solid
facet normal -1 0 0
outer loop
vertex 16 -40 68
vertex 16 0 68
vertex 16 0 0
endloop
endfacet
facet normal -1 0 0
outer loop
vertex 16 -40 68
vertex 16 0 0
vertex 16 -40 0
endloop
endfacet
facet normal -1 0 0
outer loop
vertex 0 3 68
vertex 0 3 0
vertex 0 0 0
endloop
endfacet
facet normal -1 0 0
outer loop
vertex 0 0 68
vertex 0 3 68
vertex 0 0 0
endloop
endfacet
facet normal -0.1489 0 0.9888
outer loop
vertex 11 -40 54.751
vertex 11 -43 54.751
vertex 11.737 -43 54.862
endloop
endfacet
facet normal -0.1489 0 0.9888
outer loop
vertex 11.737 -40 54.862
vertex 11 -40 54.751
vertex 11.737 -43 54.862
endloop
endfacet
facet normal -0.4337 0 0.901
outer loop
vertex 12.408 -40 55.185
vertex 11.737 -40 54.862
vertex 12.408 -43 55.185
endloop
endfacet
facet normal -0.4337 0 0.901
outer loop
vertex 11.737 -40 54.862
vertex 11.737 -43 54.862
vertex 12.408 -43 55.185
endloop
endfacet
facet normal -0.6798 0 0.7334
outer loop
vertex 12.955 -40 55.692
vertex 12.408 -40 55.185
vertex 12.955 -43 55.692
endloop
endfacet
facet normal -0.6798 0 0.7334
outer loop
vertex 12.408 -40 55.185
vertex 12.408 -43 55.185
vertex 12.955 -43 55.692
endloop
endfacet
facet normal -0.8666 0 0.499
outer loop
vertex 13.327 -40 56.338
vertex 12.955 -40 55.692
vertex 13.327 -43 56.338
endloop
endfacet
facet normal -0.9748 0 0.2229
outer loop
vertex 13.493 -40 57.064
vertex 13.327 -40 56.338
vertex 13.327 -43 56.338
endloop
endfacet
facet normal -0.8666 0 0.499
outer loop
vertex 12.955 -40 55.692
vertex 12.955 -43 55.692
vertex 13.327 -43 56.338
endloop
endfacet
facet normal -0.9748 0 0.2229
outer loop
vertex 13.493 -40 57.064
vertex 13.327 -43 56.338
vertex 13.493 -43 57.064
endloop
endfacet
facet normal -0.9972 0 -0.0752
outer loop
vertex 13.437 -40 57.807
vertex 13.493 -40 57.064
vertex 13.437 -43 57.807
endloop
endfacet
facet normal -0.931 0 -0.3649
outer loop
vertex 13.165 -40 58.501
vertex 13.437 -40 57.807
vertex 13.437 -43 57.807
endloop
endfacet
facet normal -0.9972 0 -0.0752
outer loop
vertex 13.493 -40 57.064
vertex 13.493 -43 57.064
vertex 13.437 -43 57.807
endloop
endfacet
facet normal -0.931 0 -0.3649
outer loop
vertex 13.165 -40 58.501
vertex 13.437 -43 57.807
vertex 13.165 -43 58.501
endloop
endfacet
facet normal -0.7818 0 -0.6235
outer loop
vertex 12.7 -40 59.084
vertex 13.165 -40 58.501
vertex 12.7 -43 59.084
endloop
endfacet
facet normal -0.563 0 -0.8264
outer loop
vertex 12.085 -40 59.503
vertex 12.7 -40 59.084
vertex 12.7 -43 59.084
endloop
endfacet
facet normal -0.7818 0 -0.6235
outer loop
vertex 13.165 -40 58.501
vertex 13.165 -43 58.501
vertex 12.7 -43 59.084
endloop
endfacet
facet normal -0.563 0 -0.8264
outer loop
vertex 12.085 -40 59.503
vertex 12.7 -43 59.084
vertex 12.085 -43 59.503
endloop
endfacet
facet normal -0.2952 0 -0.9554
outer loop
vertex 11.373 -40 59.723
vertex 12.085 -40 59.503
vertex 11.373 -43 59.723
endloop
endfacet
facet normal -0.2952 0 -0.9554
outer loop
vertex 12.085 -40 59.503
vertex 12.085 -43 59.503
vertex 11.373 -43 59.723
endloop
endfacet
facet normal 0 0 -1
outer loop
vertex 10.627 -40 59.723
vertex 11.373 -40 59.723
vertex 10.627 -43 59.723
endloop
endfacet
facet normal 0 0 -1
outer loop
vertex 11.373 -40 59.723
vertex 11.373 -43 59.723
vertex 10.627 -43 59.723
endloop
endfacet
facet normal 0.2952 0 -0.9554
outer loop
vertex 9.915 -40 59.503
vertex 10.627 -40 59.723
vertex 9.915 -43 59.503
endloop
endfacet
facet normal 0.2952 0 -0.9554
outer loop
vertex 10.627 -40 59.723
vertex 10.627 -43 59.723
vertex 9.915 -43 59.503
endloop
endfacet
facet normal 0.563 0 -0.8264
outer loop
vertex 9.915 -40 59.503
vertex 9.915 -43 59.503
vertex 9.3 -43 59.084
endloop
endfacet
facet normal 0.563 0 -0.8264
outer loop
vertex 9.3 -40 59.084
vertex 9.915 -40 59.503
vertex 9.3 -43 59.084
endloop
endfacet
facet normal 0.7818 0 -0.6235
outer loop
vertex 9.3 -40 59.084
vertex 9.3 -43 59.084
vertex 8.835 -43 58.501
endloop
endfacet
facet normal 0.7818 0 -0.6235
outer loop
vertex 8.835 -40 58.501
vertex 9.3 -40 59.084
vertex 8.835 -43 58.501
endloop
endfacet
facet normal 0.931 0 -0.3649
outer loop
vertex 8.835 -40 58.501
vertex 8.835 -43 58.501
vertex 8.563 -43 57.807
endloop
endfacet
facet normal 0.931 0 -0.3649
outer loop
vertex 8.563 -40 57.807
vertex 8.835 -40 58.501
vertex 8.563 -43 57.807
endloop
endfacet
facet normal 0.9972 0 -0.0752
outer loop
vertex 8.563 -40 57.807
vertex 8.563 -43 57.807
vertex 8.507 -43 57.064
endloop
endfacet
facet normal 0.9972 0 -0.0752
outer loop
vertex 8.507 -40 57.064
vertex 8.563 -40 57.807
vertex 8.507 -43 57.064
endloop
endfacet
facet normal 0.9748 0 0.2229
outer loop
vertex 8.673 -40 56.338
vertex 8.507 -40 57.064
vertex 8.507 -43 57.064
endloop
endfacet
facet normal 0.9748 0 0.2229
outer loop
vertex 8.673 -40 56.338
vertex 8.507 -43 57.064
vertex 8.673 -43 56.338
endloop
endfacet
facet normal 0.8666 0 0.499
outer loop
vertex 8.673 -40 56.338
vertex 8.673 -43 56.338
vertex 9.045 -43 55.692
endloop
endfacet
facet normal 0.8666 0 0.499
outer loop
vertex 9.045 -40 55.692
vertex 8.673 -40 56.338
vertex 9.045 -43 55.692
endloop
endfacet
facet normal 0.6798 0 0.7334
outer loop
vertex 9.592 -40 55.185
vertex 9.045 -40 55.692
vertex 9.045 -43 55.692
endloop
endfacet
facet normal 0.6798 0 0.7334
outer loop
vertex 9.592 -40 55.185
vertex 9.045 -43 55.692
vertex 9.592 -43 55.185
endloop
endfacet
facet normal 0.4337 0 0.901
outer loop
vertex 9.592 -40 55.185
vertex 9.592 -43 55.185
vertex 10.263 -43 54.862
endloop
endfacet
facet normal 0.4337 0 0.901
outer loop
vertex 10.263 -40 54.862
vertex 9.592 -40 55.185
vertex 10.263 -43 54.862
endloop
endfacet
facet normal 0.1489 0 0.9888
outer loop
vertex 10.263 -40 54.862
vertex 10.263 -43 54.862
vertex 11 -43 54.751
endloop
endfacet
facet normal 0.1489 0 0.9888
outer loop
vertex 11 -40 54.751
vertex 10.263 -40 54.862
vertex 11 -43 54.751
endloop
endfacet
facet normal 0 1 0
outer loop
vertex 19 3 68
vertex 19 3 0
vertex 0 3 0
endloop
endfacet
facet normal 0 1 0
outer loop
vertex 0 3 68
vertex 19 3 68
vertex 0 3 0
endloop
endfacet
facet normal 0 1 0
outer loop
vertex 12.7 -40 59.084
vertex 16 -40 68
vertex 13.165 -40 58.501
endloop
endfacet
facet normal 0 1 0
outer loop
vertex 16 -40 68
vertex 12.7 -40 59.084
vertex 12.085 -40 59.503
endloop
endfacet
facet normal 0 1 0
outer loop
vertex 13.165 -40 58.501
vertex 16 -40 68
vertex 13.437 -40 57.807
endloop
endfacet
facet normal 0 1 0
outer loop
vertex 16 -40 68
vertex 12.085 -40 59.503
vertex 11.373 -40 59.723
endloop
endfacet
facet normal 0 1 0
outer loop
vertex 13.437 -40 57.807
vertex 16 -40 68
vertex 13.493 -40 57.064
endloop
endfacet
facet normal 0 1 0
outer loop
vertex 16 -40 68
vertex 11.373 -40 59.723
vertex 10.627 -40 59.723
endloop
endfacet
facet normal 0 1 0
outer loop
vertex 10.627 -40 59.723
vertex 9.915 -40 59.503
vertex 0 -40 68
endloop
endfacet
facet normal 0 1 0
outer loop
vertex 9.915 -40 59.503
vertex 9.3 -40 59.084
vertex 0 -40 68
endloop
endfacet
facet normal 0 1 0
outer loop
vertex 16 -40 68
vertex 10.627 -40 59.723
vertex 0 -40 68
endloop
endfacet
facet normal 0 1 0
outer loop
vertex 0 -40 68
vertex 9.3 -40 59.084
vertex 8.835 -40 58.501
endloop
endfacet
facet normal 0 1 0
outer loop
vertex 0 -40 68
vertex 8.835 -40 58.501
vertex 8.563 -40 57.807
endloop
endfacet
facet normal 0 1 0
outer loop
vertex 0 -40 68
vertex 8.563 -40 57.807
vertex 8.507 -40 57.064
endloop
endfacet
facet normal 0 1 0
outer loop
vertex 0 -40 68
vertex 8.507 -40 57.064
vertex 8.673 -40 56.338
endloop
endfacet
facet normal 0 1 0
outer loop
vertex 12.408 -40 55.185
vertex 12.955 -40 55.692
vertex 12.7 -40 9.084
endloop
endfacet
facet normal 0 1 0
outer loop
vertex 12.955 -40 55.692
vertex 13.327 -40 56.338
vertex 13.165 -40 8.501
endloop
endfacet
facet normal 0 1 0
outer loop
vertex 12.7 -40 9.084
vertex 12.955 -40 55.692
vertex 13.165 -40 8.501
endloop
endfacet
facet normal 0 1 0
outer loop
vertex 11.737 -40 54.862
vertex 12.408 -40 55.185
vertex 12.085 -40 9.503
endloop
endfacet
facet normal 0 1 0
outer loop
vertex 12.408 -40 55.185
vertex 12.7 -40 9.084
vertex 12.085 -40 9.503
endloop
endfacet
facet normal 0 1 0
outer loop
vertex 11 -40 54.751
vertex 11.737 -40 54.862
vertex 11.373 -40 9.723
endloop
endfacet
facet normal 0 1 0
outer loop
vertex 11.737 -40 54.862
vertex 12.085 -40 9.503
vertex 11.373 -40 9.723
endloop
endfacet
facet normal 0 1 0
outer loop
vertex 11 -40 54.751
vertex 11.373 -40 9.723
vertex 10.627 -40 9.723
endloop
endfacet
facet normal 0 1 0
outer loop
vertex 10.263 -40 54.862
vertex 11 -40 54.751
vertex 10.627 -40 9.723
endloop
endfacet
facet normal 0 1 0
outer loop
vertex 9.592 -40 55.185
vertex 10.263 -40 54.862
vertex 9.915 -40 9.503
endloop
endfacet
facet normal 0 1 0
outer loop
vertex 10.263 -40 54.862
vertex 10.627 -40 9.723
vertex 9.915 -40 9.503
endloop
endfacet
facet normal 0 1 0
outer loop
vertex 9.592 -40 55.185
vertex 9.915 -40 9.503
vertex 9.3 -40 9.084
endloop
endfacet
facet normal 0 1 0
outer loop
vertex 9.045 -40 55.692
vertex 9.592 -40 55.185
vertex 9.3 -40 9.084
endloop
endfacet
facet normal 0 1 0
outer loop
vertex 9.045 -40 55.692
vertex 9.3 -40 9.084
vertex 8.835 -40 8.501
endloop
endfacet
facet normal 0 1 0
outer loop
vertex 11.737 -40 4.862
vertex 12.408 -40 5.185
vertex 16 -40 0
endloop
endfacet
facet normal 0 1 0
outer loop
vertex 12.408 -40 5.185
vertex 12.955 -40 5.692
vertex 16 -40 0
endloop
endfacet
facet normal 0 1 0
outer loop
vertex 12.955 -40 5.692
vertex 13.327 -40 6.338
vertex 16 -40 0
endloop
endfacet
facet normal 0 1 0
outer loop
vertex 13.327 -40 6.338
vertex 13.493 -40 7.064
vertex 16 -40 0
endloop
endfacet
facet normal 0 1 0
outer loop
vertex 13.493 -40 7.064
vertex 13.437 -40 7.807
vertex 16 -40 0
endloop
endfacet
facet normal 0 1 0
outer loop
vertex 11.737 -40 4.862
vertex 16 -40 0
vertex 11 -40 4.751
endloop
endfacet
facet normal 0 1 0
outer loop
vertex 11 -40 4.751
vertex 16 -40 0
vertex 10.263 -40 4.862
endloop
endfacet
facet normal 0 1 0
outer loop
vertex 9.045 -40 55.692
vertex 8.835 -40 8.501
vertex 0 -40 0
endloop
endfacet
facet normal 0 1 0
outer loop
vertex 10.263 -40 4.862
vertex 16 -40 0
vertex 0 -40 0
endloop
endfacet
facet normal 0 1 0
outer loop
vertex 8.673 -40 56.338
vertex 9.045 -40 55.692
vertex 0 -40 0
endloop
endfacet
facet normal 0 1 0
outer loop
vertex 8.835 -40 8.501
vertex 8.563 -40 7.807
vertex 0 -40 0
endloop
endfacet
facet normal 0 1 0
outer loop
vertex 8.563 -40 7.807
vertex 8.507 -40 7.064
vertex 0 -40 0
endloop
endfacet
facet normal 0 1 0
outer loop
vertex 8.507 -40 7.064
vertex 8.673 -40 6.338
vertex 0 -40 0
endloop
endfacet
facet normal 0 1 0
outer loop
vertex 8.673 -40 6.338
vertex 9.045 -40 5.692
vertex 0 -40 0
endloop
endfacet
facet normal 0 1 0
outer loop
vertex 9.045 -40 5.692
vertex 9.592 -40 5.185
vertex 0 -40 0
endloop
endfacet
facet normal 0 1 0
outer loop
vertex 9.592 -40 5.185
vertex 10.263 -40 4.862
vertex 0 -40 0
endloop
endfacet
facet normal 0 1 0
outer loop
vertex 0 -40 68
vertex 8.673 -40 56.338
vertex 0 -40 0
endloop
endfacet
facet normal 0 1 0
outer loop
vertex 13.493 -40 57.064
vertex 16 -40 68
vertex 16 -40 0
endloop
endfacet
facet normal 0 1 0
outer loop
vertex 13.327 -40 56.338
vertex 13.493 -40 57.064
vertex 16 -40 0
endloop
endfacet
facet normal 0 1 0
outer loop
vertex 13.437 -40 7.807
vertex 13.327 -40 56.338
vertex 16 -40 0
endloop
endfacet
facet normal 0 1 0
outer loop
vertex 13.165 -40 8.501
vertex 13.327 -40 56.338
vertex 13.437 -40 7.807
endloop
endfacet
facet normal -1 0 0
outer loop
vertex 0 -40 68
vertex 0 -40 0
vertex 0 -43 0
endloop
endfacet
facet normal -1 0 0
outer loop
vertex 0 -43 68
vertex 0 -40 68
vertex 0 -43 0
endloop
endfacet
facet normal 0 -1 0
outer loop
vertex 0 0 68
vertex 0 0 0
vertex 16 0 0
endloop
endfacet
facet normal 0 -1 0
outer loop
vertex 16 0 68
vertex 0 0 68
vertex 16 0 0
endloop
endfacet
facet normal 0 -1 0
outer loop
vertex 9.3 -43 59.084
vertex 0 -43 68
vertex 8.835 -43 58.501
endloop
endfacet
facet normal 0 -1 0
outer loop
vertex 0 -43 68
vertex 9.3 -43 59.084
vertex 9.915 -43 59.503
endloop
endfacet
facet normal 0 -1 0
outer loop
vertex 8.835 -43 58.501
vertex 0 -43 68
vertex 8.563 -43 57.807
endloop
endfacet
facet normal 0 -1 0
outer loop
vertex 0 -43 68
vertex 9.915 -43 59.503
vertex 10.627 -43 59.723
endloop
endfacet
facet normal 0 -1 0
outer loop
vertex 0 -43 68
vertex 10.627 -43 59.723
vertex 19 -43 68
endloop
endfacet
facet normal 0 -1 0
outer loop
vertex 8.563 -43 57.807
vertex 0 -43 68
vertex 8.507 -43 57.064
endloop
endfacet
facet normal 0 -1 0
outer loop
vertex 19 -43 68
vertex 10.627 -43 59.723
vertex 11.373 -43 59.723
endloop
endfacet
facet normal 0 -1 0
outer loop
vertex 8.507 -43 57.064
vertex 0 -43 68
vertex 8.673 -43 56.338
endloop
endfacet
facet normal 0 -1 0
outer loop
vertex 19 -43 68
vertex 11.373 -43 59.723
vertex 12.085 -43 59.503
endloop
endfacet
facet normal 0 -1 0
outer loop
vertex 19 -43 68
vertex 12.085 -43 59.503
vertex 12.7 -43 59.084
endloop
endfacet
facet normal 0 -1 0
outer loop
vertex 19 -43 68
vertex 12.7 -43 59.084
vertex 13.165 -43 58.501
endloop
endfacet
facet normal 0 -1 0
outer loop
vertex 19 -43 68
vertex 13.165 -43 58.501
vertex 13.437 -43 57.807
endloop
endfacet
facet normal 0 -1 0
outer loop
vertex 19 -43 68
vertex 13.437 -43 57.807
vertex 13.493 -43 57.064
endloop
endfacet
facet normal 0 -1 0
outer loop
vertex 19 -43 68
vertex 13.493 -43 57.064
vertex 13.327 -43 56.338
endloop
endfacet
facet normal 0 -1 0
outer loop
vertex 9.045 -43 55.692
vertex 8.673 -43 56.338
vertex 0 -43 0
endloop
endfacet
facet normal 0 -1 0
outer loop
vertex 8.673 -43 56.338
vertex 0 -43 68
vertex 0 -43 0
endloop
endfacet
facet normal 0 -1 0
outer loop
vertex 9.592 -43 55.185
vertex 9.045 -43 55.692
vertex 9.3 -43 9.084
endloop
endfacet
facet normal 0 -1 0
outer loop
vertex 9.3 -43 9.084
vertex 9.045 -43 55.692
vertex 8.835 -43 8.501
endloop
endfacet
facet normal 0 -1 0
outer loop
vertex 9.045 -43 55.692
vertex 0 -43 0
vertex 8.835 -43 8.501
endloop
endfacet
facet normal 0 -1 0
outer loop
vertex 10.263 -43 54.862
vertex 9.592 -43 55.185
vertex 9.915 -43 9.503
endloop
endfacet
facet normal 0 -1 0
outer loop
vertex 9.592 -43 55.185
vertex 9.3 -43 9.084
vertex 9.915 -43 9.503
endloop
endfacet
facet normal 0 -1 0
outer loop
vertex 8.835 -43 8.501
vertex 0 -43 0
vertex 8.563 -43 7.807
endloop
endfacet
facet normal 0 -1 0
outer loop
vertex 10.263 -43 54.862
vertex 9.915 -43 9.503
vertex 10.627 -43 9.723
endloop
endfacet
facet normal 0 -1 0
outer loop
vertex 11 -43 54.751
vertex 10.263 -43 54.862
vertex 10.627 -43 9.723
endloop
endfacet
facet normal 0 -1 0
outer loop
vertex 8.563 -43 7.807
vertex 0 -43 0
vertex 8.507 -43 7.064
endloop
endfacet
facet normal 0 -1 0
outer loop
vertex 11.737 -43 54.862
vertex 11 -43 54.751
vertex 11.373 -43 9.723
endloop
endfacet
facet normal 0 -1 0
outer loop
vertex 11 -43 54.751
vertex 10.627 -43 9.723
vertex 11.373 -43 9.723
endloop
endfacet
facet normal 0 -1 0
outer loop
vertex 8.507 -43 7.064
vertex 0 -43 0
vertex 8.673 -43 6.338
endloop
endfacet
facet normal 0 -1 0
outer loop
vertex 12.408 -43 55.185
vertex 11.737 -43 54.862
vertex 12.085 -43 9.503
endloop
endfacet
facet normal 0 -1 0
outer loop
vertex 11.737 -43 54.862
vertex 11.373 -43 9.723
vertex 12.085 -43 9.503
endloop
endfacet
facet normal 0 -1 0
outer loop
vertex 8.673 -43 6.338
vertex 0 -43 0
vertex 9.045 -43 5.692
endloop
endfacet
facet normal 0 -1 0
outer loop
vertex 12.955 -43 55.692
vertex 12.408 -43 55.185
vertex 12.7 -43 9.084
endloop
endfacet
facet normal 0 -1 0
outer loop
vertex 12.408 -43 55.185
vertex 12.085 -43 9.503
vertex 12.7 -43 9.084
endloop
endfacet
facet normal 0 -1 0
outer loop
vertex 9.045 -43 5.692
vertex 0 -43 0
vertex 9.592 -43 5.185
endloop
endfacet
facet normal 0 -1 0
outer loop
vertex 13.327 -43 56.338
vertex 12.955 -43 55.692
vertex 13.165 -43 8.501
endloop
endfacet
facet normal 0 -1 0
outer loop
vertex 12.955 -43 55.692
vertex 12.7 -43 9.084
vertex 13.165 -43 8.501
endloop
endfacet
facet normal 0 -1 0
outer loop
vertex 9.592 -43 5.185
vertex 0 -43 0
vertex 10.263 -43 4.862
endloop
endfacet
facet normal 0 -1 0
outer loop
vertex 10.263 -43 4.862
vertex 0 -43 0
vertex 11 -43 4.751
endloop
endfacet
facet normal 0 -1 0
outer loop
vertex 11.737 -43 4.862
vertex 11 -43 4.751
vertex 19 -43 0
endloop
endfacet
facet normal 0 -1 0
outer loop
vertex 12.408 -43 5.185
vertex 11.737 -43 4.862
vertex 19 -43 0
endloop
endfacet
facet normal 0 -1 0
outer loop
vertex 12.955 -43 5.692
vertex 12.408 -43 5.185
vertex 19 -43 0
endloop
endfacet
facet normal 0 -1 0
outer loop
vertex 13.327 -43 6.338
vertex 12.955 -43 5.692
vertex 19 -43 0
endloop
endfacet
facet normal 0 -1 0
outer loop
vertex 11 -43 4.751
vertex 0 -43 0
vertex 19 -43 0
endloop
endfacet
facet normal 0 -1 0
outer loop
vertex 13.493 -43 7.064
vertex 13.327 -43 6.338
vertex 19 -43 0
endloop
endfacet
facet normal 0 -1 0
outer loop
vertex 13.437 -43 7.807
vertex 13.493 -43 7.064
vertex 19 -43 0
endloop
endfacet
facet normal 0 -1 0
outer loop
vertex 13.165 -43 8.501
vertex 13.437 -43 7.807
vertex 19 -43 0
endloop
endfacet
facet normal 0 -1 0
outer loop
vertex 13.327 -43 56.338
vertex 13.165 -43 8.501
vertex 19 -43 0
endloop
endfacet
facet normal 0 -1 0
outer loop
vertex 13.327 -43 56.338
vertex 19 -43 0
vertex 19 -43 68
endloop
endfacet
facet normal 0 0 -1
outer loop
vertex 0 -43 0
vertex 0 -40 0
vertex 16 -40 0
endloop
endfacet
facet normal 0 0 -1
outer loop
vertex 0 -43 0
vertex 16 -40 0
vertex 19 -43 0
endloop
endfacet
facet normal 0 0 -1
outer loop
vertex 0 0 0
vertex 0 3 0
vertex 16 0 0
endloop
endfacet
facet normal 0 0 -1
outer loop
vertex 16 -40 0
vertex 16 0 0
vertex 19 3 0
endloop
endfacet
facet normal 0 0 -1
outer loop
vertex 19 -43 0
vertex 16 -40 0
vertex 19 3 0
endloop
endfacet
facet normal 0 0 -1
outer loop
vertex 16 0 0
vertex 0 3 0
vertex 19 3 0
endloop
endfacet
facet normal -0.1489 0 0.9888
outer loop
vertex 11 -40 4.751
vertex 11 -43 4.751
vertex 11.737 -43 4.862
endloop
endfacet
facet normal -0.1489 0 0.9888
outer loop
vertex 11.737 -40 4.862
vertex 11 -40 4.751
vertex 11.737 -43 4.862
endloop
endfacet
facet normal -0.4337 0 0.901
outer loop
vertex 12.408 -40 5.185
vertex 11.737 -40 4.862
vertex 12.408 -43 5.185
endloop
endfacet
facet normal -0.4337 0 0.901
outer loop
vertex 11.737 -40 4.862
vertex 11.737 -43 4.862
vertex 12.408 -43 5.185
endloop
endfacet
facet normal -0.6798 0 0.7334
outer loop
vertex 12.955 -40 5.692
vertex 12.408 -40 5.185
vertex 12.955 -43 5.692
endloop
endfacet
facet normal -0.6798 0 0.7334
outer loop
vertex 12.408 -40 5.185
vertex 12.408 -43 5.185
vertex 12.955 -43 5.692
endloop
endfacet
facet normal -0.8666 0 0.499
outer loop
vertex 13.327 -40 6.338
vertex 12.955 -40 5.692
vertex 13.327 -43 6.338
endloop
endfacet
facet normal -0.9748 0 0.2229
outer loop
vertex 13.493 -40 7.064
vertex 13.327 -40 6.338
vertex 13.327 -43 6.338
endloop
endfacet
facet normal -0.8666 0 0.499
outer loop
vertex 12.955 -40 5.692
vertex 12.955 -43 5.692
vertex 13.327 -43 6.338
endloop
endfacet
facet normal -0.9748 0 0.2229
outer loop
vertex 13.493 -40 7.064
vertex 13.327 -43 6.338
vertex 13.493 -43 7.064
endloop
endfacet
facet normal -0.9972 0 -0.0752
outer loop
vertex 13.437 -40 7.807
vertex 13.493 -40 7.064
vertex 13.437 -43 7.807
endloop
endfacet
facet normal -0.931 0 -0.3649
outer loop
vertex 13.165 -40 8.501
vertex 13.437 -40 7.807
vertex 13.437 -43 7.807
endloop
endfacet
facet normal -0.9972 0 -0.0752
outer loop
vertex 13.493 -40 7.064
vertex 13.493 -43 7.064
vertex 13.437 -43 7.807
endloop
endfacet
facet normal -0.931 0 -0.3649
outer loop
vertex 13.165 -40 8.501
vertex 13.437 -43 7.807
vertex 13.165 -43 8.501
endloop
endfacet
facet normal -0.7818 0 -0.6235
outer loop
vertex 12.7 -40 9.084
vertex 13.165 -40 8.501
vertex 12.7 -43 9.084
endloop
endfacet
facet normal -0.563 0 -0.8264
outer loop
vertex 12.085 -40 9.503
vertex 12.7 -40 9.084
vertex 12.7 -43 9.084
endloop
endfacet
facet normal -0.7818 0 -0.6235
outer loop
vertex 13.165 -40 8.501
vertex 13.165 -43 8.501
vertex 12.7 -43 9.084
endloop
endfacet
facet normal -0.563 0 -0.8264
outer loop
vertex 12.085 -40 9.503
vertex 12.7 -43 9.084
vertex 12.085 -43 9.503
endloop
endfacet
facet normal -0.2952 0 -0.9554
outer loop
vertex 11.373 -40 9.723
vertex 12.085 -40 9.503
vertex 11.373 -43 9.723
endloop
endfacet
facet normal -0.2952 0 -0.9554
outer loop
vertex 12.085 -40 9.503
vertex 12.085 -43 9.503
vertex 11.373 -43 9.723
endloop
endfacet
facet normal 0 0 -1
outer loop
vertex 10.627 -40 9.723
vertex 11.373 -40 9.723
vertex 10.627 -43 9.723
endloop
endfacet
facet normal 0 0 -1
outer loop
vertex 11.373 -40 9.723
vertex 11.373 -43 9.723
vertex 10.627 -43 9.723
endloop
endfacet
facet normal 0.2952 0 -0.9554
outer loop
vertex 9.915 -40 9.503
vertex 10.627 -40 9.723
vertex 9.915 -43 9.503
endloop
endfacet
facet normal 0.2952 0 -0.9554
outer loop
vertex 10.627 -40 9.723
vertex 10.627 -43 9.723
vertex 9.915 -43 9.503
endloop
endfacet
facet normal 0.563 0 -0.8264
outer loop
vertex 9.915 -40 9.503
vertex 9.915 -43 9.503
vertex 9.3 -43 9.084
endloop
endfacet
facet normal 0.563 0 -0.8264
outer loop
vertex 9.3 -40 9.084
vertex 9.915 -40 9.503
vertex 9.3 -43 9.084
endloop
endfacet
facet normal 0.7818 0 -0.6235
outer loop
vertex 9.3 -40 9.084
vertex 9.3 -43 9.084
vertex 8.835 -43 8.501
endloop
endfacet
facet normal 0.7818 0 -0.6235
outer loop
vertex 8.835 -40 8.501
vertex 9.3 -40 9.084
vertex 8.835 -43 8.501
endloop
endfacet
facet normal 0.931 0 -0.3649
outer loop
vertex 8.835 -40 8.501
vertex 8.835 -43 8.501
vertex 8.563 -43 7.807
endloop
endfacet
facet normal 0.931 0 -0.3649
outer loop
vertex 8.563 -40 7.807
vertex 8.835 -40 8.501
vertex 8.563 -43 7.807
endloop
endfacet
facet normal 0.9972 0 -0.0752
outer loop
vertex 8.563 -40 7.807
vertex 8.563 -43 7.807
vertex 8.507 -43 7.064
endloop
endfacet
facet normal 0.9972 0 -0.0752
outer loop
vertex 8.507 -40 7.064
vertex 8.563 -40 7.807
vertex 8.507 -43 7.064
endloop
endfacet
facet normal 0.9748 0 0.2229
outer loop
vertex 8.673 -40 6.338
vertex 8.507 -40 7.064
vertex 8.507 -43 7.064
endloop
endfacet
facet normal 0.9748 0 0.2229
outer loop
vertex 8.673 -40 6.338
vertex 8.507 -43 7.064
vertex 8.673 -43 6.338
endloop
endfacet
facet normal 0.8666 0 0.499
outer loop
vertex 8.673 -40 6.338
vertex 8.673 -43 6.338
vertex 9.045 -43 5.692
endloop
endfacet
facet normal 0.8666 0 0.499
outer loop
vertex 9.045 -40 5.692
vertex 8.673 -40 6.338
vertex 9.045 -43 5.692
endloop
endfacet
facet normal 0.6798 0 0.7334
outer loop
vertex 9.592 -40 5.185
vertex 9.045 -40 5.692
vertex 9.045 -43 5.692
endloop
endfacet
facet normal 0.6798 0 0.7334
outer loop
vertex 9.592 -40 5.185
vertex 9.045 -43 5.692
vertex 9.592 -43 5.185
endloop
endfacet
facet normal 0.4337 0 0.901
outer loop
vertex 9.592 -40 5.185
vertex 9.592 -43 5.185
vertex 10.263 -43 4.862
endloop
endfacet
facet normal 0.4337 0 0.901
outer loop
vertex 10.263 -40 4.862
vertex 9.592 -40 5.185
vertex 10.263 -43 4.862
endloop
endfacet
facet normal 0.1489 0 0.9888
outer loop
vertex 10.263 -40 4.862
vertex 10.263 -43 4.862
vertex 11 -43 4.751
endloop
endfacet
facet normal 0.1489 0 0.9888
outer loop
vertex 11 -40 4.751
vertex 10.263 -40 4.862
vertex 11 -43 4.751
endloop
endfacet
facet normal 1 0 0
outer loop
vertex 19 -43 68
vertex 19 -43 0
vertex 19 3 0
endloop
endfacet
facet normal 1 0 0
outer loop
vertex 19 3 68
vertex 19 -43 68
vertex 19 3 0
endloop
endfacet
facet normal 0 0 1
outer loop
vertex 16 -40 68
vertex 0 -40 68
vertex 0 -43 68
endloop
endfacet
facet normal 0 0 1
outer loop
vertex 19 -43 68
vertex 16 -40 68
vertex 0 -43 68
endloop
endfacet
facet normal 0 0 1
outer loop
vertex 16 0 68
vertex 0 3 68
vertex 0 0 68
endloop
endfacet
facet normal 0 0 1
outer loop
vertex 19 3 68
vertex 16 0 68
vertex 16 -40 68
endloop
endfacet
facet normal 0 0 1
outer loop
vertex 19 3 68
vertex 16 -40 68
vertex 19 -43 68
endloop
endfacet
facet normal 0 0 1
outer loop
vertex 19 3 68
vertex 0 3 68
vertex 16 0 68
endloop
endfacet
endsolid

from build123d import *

# Parameters (mm, degrees)
EXTRUDE_1_DEPTH     = 68
SKETCH_2_R          = 2.5
CUT_EXTRUDE_1_DEPTH = 10


with BuildPart() as part:
    # 草图1 → 凸台-拉伸1 (new body)
    with BuildSketch(Plane.XY):
        Polygon((0, 0), (16, 0), (16, -40), (0, -40), (0, -43), (19, -43), (19, 3), (0, 3), align=None)
    extrude(amount=EXTRUDE_1_DEPTH)

    # 草图2 → 切除-拉伸1 (cut)
    with BuildSketch(Plane.XZ.offset(43)):
        with Locations(Location((11, 7.250946933, 0), (0, 0, 270))):
            Circle(SKETCH_2_R)
        with Locations(Location((11, 57.250946933, 0), (0, 0, 270))):
            Circle(SKETCH_2_R)
    extrude(amount=-CUT_EXTRUDE_1_DEPTH, mode=Mode.SUBTRACT)


solid = part.part
